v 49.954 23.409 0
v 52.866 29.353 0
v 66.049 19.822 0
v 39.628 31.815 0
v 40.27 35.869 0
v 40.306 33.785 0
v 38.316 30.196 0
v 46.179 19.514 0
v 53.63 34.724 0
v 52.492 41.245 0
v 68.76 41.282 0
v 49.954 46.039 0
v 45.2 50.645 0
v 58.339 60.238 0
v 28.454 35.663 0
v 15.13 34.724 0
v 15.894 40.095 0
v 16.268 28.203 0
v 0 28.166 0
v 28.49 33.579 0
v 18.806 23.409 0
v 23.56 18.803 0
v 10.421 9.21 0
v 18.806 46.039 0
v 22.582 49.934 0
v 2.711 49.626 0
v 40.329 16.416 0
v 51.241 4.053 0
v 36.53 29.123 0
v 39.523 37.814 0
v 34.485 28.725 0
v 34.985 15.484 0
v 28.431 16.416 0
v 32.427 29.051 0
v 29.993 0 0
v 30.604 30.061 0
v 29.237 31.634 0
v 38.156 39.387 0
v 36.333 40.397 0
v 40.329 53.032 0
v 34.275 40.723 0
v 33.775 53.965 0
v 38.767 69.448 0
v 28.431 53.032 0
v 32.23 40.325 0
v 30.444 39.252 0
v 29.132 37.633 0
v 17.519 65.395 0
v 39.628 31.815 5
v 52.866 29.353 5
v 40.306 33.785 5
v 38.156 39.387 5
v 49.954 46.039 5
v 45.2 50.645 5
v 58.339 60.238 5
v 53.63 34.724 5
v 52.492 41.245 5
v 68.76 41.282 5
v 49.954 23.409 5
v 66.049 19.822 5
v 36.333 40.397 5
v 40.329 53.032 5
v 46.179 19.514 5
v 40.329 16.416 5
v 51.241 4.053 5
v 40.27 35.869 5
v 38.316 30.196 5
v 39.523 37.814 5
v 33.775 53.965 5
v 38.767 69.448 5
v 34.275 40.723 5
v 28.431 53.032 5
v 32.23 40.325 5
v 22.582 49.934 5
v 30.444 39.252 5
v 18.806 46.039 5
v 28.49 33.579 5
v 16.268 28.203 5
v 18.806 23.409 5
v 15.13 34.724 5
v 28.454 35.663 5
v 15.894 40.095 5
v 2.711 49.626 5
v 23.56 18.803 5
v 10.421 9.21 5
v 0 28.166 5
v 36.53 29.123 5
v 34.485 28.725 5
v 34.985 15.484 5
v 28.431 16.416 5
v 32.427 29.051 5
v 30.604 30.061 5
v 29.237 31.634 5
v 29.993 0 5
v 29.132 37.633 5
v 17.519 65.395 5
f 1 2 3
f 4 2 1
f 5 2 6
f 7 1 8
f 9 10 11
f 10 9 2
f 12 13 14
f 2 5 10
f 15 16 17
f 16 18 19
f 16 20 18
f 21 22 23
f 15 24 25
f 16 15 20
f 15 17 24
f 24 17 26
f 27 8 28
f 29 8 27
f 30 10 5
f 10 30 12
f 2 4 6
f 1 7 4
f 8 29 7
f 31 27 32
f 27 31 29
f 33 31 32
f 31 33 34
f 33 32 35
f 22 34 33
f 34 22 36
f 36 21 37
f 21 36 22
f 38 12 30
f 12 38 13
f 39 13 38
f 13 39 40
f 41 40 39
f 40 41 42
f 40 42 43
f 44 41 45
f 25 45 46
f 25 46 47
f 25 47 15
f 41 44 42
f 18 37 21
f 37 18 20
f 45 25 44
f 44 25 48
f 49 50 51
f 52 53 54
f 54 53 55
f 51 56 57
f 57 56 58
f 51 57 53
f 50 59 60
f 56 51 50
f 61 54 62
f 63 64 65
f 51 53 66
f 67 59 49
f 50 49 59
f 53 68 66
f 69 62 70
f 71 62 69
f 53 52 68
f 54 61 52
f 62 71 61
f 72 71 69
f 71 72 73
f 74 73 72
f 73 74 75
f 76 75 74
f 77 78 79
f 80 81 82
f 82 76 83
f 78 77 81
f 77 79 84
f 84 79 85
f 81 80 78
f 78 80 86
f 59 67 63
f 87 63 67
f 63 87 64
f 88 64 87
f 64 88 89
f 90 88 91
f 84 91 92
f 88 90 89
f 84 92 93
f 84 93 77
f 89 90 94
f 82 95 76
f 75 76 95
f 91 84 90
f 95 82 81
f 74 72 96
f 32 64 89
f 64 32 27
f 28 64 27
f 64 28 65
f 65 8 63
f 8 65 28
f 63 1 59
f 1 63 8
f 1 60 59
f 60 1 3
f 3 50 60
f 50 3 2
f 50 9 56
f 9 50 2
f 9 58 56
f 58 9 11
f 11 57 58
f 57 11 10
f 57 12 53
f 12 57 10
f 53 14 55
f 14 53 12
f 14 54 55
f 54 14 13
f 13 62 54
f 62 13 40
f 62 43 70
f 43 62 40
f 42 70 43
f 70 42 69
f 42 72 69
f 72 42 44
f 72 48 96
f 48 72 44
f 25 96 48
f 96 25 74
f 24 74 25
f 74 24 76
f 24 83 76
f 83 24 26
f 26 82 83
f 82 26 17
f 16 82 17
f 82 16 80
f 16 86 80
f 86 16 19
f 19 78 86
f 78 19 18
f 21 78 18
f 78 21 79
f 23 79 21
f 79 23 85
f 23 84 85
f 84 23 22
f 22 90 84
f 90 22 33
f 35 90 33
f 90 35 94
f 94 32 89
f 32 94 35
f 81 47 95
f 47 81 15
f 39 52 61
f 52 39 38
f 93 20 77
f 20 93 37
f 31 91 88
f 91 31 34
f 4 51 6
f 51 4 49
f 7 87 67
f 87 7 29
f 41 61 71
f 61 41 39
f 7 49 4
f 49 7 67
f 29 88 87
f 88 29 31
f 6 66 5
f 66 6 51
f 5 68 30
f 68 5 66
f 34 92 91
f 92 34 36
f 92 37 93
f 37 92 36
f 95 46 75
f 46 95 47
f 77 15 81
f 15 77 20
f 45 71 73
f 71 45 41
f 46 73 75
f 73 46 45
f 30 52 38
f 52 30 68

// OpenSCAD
$fn = 32;

// ----------------------------------------------------------------------
// Star wheel: 10-point ratchet, R35
// ----------------------------------------------------------------------

// --- parameters (mm) ---
n_points = 10;            // number of points / teeth
r_out = 35;               // tip radius
r_in = 19.25;             // root radius
bore_r = 6;               // centre bore radius
plate_t = 5;              // plate thickness, Z (extrusion height)
bore_d = 12;              // centre bore diameter

profile = [[15.13, 34.724], [0, 28.166], [16.268, 28.203], [18.806, 23.409], [10.421, 9.21], [23.56, 18.803], [28.431, 16.416], [29.993, 0], [34.985, 15.484], [40.329, 16.416], [51.241, 4.053], [46.179, 19.514], [49.954, 23.409], [66.049, 19.822], [52.866, 29.353], [53.63, 34.724], [68.76, 41.282], [52.492, 41.245], [49.954, 46.039], [58.339, 60.238], [45.2, 50.645], [40.329, 53.032], [38.767, 69.448], [33.775, 53.965], [28.431, 53.032], [17.519, 65.395], [22.582, 49.934], [18.806, 46.039], [2.711, 49.626], [15.894, 40.095]];  // primary outline, 30 points, counter clockwise
void_1 = [[40.27, 35.869], [39.523, 37.814], [38.156, 39.387], [36.333, 40.397], [34.275, 40.723], [32.23, 40.325], [30.444, 39.252], [29.132, 37.633], [28.454, 35.663], [28.49, 33.579], [29.237, 31.634], [30.604, 30.061], [32.427, 29.051], [34.485, 28.725], [36.53, 29.123], [38.316, 30.196], [39.628, 31.815], [40.306, 33.785]];  // centre bore, 18 points

// --- the one profile operation ---
difference() {
  linear_extrude(height = plate_t) polygon(points = profile);
  translate([0, 0, -1])
    linear_extrude(height = plate_t + 2) polygon(points = void_1);
}
